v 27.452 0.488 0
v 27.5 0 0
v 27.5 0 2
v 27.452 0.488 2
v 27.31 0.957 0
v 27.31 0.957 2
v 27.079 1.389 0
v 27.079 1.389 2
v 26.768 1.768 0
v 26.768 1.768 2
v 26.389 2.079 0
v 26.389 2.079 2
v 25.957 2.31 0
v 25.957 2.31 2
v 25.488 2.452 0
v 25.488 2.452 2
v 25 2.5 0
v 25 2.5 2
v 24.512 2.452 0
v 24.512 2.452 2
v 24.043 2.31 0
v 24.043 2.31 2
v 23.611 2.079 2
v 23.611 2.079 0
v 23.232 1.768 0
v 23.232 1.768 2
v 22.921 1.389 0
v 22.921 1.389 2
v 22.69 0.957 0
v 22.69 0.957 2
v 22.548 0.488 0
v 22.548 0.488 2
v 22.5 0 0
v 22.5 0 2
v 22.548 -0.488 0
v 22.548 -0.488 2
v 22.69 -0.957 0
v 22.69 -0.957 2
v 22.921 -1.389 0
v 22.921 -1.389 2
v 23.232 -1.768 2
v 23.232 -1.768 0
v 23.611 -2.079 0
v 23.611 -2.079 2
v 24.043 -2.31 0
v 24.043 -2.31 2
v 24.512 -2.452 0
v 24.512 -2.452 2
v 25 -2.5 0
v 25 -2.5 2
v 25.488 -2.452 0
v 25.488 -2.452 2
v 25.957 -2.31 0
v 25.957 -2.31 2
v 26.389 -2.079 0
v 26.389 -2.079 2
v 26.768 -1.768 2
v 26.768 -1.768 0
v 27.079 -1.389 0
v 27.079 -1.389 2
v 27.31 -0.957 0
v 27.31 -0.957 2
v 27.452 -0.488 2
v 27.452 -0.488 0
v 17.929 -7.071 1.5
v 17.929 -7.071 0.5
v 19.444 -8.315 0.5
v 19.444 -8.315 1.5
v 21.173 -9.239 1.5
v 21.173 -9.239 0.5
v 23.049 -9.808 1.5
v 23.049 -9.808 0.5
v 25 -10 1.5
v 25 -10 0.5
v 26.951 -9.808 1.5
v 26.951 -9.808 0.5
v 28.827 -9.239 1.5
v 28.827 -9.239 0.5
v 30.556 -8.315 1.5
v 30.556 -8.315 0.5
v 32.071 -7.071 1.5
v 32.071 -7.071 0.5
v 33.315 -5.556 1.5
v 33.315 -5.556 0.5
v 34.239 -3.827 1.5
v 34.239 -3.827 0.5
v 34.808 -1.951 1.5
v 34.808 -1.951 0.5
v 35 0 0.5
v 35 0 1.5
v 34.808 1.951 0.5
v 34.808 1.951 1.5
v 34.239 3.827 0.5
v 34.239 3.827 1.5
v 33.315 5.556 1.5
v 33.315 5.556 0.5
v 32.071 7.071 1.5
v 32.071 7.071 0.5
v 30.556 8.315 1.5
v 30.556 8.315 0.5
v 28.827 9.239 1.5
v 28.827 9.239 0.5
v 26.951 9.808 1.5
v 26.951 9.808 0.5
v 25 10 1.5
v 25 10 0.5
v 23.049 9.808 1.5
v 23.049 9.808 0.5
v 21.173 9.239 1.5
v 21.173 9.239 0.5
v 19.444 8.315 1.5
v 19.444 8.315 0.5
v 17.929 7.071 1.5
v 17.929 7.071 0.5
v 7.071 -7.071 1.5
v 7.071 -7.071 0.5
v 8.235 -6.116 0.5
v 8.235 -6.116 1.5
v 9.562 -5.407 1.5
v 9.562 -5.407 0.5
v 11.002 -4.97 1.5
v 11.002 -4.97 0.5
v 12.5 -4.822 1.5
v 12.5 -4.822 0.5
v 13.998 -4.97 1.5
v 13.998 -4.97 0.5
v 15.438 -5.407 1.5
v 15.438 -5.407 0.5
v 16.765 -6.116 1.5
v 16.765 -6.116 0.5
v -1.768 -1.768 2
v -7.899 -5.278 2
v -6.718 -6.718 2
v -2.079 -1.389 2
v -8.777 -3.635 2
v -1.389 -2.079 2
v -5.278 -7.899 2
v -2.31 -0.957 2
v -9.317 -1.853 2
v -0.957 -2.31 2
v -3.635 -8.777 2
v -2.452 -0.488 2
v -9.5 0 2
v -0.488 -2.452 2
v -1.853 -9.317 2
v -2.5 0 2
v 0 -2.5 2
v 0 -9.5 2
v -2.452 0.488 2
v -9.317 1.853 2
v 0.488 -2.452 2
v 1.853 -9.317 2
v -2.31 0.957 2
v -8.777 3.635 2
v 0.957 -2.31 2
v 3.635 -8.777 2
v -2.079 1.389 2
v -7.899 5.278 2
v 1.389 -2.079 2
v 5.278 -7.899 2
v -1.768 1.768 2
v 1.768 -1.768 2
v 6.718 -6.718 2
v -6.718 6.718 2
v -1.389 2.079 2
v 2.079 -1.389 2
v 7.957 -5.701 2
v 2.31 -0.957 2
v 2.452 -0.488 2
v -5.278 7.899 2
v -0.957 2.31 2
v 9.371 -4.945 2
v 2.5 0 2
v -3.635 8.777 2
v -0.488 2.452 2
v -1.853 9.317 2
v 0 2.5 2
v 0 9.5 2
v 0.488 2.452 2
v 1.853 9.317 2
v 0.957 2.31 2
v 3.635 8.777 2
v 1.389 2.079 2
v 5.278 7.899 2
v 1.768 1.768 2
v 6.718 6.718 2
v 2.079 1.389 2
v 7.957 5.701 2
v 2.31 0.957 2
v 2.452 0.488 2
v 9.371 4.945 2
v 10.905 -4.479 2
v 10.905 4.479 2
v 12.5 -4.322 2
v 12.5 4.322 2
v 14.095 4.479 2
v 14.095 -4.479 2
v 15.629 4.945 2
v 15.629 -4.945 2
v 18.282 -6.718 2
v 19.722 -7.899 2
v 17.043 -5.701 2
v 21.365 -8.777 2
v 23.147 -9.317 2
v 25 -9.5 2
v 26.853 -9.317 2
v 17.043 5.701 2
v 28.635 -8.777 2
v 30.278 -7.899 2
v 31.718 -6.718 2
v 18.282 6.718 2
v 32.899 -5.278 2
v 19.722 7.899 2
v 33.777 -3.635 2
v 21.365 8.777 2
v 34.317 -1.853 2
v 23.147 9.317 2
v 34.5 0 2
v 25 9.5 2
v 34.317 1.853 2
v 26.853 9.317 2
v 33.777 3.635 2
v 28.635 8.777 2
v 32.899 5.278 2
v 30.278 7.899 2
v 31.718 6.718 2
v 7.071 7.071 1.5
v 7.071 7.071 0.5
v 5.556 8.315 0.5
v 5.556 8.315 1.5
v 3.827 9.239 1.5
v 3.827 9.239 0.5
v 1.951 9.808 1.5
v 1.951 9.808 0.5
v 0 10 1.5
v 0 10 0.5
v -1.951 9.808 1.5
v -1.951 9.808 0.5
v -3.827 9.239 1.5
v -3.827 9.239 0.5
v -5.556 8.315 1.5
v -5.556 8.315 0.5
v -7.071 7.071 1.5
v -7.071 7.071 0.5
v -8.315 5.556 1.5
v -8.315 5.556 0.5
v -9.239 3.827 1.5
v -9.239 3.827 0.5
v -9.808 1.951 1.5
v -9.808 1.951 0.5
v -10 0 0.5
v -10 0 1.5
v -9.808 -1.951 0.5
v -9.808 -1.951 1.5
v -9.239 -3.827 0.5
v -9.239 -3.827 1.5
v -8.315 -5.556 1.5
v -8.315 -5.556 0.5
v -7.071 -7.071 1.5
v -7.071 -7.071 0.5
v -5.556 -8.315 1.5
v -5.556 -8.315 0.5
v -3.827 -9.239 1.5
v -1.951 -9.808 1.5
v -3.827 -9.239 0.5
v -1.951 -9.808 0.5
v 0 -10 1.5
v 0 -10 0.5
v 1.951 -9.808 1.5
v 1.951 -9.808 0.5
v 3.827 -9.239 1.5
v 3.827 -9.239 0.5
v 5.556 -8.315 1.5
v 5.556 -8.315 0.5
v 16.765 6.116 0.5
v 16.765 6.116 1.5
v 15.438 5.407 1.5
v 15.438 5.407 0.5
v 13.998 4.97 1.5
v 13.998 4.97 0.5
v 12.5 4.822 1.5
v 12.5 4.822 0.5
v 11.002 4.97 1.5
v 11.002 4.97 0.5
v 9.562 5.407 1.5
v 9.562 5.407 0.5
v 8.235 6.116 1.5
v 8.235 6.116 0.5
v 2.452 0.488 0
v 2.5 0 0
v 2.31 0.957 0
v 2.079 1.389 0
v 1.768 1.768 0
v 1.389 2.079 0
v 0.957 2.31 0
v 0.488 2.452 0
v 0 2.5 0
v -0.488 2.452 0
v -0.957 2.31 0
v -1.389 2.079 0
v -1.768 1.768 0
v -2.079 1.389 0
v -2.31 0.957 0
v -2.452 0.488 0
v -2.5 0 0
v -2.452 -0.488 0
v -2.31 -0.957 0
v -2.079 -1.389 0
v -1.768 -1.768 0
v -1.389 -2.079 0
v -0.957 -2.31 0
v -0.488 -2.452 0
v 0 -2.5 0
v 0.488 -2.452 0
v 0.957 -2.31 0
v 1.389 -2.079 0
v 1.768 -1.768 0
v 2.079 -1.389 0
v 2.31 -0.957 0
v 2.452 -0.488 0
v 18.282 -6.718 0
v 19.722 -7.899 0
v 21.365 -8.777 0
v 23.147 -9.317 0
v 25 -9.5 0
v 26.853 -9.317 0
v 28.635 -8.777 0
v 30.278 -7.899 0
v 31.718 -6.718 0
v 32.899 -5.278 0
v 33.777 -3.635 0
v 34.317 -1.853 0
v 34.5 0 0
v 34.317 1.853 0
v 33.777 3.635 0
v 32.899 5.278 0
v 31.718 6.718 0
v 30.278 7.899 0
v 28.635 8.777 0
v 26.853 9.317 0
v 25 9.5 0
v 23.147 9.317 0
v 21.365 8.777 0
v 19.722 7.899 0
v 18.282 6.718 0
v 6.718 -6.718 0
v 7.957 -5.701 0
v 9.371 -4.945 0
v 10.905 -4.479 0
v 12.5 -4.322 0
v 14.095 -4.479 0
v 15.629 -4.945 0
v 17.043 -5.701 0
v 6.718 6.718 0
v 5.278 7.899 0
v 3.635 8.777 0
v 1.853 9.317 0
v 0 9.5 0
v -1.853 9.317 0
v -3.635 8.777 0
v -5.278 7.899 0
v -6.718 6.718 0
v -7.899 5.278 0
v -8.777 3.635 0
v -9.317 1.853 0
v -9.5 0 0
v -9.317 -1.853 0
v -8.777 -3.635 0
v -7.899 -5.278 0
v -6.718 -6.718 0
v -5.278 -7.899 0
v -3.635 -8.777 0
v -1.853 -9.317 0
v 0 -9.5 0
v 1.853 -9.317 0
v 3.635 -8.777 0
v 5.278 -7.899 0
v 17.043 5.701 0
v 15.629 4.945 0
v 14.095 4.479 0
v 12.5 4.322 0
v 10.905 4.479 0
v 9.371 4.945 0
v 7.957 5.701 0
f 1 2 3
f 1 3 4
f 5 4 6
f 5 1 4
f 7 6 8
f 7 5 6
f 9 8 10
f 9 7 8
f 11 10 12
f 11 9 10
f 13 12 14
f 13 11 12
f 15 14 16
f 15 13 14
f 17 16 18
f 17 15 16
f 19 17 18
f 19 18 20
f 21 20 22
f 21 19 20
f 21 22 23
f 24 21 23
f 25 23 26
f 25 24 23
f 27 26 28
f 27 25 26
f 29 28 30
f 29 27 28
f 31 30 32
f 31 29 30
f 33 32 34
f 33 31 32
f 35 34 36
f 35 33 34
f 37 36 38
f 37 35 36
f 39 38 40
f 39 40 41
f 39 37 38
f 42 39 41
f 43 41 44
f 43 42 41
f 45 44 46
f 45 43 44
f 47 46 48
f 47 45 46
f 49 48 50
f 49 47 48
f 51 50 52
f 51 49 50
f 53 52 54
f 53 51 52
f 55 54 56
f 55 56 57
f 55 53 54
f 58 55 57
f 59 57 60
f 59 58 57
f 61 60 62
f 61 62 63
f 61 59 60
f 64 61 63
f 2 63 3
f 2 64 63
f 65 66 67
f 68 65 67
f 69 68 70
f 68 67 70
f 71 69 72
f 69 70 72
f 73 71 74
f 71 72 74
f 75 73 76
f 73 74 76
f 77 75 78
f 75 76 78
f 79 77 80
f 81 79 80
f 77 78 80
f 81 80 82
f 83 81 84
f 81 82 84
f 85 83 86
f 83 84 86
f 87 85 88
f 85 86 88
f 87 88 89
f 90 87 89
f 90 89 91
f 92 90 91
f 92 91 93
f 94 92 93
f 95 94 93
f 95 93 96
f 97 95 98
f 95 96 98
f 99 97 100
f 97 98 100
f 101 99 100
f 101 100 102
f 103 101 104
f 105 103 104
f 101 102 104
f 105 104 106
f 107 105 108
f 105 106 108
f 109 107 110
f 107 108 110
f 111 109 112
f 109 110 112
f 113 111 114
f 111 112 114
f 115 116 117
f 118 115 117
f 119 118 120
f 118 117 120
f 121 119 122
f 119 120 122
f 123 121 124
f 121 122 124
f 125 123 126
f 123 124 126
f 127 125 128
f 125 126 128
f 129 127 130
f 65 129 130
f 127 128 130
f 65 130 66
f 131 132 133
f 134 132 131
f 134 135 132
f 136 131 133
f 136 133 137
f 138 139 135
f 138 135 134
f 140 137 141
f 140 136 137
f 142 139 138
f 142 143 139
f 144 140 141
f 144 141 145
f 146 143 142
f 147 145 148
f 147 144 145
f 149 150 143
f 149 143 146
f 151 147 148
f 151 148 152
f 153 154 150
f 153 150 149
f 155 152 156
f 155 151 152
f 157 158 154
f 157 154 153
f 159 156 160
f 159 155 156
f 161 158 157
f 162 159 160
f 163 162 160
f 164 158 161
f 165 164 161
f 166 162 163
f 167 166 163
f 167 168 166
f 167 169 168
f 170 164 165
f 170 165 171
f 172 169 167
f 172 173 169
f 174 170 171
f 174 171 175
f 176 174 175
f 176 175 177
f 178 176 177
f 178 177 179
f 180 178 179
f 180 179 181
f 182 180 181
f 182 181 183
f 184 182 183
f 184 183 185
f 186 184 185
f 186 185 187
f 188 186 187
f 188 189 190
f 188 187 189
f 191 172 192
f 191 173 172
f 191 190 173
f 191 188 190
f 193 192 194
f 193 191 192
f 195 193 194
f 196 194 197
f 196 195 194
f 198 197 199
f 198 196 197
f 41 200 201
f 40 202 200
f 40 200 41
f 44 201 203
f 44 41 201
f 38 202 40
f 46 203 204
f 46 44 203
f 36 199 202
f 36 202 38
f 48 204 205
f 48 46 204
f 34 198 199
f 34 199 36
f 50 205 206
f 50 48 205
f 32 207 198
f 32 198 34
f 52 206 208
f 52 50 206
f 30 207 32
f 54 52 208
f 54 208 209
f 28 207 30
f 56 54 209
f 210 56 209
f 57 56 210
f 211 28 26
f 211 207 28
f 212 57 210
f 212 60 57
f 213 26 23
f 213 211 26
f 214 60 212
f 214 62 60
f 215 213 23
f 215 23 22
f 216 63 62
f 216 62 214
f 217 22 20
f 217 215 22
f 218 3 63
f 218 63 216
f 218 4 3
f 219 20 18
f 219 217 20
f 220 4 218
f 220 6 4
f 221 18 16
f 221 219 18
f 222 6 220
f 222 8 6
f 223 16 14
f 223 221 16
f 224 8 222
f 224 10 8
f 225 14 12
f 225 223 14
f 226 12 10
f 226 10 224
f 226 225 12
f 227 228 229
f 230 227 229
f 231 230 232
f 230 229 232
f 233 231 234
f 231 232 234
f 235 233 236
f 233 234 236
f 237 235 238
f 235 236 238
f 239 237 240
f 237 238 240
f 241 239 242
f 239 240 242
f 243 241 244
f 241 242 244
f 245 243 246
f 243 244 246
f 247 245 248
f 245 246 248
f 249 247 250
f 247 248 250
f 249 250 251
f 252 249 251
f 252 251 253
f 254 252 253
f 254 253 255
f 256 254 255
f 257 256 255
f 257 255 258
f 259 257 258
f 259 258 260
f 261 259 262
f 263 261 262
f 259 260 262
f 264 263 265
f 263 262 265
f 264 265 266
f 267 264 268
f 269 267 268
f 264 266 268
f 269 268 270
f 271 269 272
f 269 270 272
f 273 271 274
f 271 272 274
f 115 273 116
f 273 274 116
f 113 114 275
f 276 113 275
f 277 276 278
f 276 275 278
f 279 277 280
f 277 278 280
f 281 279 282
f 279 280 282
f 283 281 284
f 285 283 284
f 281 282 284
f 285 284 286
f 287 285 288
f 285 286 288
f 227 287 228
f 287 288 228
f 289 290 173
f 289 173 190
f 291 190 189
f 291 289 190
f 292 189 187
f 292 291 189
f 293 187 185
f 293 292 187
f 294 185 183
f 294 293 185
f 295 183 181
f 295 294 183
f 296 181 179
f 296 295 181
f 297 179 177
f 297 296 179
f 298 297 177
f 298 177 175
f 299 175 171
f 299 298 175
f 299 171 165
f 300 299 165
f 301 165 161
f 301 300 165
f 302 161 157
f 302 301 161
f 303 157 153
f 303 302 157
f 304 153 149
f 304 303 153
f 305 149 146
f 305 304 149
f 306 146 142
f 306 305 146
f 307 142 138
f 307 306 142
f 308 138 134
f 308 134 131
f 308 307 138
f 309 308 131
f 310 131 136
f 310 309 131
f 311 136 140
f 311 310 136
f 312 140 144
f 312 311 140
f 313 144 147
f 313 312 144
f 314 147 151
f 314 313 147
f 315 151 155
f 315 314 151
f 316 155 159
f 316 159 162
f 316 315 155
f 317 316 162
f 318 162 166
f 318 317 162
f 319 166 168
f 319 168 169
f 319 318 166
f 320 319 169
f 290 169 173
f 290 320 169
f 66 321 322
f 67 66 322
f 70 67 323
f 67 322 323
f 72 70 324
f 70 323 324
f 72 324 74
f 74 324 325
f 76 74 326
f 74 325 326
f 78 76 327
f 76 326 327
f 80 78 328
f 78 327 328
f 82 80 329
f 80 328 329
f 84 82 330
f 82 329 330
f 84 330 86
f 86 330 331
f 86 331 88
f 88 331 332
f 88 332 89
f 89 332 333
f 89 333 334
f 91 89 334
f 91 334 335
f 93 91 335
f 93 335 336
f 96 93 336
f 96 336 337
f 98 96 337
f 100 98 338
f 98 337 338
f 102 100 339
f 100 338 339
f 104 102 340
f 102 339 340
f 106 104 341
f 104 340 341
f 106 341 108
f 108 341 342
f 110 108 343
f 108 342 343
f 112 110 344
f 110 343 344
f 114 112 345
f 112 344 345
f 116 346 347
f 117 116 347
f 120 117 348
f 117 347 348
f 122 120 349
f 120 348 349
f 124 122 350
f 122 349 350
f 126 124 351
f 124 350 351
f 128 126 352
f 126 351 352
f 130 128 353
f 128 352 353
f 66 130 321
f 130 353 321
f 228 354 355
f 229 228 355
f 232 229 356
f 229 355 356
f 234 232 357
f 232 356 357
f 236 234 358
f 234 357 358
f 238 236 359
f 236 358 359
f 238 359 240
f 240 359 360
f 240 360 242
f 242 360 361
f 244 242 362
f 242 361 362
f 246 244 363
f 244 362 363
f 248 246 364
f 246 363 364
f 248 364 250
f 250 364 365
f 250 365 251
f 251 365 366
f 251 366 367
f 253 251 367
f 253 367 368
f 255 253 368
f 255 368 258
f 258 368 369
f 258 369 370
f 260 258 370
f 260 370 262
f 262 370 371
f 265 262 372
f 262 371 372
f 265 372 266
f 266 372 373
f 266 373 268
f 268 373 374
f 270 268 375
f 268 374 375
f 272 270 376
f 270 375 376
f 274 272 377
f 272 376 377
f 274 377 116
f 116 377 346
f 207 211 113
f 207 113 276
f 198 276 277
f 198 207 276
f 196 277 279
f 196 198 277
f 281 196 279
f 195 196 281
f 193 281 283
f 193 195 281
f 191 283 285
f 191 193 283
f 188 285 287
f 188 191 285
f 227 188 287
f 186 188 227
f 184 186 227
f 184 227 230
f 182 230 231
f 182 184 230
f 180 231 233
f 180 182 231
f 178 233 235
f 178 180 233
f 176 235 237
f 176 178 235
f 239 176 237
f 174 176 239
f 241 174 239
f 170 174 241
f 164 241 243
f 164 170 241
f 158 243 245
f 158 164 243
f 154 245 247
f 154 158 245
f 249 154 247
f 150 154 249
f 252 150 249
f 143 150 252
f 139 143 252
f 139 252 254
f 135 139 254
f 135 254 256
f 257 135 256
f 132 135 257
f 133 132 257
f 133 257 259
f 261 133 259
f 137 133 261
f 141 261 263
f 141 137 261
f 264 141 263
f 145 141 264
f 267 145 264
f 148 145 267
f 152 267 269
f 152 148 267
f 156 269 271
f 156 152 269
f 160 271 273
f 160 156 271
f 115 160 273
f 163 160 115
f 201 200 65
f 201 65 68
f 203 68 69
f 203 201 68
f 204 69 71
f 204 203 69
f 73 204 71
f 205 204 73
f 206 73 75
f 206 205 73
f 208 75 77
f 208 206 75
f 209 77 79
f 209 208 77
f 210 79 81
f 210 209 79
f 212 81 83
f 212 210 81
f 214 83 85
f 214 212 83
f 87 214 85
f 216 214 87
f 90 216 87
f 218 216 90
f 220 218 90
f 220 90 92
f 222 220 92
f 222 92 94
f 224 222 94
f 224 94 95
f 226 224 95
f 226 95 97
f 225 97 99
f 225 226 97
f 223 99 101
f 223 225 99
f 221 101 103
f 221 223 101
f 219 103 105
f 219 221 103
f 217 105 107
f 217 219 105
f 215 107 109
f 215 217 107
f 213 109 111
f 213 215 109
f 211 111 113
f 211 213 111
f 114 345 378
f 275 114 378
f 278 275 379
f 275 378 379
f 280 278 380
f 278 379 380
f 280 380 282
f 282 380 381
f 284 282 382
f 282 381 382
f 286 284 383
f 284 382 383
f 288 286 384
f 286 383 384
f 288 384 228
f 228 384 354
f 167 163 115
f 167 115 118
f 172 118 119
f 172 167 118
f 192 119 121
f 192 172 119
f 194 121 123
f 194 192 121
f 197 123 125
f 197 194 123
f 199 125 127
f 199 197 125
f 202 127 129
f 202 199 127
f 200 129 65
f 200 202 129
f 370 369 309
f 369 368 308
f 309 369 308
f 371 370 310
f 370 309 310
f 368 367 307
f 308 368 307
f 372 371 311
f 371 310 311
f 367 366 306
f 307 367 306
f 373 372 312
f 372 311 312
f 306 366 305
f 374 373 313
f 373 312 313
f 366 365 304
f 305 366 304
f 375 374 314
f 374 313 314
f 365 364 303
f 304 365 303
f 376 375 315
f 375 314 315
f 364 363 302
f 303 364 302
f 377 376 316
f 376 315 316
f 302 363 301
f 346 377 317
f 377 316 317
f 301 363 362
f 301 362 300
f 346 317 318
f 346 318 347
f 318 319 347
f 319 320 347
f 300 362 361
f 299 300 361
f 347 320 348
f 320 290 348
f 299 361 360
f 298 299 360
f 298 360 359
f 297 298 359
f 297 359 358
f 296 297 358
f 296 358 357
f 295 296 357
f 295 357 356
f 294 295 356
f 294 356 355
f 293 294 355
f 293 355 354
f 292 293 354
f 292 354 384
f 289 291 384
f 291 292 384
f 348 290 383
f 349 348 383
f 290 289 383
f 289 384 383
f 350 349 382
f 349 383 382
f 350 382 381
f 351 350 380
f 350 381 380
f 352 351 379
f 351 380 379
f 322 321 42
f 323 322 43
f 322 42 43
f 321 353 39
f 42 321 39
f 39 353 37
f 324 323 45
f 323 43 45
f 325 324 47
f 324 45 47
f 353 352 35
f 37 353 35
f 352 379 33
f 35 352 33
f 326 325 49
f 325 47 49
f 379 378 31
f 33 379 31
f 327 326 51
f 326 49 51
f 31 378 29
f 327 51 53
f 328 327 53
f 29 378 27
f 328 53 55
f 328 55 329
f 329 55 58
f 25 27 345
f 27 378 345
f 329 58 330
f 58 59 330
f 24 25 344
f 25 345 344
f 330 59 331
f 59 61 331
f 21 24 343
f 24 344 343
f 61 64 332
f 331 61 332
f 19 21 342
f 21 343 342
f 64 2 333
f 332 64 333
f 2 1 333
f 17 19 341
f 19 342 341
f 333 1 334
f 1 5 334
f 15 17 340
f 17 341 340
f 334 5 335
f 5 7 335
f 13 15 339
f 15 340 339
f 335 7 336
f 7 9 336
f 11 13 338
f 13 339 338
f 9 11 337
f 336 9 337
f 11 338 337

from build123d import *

# Parameters (mm, degrees)
SKETCH1_R           = 2.5
BOSS_EXTRUDE1_DEPTH = 2
CHAMFER1_SIZE       = 0.5


with BuildPart() as part:
    # Sketch1 → Boss-Extrude1 (new body)
    with BuildSketch(Plane.XY):
        with BuildLine():
            ThreePointArc((17.928932188, -7.071067812), (35, 0), (17.928932188, 7.071067812))
            ThreePointArc((17.928932188, 7.071067812), (12.5, 4.82233047), (7.071067812, 7.071067812))
            ThreePointArc((7.071067812, 7.071067812), (-10, 0), (7.071067812, -7.071067812))
            ThreePointArc((7.071067812, -7.071067812), (12.5, -4.82233047), (17.928932188, -7.071067812))
        make_face()
        with Locations((25, 0)):
            Circle(SKETCH1_R, mode=Mode.SUBTRACT)
        Circle(SKETCH1_R, mode=Mode.SUBTRACT)
    extrude(amount=BOSS_EXTRUDE1_DEPTH)

    # Chamfer1
    chamfer1_edges = [part.edges().sort_by_distance(p)[0] for p in [
        (12.5, -4.82233047, 2),
        (-10, 0, 2),
        (12.5, 4.82233047, 2),
        (-10, 0, 0),
        (12.5, -4.82233047, 0),
        (35, 0, 0),
        (12.5, 4.82233047, 0),
        (35, 0, 2),
    ]]
    chamfer(chamfer1_edges, length=CHAMFER1_SIZE)


solid = part.part
